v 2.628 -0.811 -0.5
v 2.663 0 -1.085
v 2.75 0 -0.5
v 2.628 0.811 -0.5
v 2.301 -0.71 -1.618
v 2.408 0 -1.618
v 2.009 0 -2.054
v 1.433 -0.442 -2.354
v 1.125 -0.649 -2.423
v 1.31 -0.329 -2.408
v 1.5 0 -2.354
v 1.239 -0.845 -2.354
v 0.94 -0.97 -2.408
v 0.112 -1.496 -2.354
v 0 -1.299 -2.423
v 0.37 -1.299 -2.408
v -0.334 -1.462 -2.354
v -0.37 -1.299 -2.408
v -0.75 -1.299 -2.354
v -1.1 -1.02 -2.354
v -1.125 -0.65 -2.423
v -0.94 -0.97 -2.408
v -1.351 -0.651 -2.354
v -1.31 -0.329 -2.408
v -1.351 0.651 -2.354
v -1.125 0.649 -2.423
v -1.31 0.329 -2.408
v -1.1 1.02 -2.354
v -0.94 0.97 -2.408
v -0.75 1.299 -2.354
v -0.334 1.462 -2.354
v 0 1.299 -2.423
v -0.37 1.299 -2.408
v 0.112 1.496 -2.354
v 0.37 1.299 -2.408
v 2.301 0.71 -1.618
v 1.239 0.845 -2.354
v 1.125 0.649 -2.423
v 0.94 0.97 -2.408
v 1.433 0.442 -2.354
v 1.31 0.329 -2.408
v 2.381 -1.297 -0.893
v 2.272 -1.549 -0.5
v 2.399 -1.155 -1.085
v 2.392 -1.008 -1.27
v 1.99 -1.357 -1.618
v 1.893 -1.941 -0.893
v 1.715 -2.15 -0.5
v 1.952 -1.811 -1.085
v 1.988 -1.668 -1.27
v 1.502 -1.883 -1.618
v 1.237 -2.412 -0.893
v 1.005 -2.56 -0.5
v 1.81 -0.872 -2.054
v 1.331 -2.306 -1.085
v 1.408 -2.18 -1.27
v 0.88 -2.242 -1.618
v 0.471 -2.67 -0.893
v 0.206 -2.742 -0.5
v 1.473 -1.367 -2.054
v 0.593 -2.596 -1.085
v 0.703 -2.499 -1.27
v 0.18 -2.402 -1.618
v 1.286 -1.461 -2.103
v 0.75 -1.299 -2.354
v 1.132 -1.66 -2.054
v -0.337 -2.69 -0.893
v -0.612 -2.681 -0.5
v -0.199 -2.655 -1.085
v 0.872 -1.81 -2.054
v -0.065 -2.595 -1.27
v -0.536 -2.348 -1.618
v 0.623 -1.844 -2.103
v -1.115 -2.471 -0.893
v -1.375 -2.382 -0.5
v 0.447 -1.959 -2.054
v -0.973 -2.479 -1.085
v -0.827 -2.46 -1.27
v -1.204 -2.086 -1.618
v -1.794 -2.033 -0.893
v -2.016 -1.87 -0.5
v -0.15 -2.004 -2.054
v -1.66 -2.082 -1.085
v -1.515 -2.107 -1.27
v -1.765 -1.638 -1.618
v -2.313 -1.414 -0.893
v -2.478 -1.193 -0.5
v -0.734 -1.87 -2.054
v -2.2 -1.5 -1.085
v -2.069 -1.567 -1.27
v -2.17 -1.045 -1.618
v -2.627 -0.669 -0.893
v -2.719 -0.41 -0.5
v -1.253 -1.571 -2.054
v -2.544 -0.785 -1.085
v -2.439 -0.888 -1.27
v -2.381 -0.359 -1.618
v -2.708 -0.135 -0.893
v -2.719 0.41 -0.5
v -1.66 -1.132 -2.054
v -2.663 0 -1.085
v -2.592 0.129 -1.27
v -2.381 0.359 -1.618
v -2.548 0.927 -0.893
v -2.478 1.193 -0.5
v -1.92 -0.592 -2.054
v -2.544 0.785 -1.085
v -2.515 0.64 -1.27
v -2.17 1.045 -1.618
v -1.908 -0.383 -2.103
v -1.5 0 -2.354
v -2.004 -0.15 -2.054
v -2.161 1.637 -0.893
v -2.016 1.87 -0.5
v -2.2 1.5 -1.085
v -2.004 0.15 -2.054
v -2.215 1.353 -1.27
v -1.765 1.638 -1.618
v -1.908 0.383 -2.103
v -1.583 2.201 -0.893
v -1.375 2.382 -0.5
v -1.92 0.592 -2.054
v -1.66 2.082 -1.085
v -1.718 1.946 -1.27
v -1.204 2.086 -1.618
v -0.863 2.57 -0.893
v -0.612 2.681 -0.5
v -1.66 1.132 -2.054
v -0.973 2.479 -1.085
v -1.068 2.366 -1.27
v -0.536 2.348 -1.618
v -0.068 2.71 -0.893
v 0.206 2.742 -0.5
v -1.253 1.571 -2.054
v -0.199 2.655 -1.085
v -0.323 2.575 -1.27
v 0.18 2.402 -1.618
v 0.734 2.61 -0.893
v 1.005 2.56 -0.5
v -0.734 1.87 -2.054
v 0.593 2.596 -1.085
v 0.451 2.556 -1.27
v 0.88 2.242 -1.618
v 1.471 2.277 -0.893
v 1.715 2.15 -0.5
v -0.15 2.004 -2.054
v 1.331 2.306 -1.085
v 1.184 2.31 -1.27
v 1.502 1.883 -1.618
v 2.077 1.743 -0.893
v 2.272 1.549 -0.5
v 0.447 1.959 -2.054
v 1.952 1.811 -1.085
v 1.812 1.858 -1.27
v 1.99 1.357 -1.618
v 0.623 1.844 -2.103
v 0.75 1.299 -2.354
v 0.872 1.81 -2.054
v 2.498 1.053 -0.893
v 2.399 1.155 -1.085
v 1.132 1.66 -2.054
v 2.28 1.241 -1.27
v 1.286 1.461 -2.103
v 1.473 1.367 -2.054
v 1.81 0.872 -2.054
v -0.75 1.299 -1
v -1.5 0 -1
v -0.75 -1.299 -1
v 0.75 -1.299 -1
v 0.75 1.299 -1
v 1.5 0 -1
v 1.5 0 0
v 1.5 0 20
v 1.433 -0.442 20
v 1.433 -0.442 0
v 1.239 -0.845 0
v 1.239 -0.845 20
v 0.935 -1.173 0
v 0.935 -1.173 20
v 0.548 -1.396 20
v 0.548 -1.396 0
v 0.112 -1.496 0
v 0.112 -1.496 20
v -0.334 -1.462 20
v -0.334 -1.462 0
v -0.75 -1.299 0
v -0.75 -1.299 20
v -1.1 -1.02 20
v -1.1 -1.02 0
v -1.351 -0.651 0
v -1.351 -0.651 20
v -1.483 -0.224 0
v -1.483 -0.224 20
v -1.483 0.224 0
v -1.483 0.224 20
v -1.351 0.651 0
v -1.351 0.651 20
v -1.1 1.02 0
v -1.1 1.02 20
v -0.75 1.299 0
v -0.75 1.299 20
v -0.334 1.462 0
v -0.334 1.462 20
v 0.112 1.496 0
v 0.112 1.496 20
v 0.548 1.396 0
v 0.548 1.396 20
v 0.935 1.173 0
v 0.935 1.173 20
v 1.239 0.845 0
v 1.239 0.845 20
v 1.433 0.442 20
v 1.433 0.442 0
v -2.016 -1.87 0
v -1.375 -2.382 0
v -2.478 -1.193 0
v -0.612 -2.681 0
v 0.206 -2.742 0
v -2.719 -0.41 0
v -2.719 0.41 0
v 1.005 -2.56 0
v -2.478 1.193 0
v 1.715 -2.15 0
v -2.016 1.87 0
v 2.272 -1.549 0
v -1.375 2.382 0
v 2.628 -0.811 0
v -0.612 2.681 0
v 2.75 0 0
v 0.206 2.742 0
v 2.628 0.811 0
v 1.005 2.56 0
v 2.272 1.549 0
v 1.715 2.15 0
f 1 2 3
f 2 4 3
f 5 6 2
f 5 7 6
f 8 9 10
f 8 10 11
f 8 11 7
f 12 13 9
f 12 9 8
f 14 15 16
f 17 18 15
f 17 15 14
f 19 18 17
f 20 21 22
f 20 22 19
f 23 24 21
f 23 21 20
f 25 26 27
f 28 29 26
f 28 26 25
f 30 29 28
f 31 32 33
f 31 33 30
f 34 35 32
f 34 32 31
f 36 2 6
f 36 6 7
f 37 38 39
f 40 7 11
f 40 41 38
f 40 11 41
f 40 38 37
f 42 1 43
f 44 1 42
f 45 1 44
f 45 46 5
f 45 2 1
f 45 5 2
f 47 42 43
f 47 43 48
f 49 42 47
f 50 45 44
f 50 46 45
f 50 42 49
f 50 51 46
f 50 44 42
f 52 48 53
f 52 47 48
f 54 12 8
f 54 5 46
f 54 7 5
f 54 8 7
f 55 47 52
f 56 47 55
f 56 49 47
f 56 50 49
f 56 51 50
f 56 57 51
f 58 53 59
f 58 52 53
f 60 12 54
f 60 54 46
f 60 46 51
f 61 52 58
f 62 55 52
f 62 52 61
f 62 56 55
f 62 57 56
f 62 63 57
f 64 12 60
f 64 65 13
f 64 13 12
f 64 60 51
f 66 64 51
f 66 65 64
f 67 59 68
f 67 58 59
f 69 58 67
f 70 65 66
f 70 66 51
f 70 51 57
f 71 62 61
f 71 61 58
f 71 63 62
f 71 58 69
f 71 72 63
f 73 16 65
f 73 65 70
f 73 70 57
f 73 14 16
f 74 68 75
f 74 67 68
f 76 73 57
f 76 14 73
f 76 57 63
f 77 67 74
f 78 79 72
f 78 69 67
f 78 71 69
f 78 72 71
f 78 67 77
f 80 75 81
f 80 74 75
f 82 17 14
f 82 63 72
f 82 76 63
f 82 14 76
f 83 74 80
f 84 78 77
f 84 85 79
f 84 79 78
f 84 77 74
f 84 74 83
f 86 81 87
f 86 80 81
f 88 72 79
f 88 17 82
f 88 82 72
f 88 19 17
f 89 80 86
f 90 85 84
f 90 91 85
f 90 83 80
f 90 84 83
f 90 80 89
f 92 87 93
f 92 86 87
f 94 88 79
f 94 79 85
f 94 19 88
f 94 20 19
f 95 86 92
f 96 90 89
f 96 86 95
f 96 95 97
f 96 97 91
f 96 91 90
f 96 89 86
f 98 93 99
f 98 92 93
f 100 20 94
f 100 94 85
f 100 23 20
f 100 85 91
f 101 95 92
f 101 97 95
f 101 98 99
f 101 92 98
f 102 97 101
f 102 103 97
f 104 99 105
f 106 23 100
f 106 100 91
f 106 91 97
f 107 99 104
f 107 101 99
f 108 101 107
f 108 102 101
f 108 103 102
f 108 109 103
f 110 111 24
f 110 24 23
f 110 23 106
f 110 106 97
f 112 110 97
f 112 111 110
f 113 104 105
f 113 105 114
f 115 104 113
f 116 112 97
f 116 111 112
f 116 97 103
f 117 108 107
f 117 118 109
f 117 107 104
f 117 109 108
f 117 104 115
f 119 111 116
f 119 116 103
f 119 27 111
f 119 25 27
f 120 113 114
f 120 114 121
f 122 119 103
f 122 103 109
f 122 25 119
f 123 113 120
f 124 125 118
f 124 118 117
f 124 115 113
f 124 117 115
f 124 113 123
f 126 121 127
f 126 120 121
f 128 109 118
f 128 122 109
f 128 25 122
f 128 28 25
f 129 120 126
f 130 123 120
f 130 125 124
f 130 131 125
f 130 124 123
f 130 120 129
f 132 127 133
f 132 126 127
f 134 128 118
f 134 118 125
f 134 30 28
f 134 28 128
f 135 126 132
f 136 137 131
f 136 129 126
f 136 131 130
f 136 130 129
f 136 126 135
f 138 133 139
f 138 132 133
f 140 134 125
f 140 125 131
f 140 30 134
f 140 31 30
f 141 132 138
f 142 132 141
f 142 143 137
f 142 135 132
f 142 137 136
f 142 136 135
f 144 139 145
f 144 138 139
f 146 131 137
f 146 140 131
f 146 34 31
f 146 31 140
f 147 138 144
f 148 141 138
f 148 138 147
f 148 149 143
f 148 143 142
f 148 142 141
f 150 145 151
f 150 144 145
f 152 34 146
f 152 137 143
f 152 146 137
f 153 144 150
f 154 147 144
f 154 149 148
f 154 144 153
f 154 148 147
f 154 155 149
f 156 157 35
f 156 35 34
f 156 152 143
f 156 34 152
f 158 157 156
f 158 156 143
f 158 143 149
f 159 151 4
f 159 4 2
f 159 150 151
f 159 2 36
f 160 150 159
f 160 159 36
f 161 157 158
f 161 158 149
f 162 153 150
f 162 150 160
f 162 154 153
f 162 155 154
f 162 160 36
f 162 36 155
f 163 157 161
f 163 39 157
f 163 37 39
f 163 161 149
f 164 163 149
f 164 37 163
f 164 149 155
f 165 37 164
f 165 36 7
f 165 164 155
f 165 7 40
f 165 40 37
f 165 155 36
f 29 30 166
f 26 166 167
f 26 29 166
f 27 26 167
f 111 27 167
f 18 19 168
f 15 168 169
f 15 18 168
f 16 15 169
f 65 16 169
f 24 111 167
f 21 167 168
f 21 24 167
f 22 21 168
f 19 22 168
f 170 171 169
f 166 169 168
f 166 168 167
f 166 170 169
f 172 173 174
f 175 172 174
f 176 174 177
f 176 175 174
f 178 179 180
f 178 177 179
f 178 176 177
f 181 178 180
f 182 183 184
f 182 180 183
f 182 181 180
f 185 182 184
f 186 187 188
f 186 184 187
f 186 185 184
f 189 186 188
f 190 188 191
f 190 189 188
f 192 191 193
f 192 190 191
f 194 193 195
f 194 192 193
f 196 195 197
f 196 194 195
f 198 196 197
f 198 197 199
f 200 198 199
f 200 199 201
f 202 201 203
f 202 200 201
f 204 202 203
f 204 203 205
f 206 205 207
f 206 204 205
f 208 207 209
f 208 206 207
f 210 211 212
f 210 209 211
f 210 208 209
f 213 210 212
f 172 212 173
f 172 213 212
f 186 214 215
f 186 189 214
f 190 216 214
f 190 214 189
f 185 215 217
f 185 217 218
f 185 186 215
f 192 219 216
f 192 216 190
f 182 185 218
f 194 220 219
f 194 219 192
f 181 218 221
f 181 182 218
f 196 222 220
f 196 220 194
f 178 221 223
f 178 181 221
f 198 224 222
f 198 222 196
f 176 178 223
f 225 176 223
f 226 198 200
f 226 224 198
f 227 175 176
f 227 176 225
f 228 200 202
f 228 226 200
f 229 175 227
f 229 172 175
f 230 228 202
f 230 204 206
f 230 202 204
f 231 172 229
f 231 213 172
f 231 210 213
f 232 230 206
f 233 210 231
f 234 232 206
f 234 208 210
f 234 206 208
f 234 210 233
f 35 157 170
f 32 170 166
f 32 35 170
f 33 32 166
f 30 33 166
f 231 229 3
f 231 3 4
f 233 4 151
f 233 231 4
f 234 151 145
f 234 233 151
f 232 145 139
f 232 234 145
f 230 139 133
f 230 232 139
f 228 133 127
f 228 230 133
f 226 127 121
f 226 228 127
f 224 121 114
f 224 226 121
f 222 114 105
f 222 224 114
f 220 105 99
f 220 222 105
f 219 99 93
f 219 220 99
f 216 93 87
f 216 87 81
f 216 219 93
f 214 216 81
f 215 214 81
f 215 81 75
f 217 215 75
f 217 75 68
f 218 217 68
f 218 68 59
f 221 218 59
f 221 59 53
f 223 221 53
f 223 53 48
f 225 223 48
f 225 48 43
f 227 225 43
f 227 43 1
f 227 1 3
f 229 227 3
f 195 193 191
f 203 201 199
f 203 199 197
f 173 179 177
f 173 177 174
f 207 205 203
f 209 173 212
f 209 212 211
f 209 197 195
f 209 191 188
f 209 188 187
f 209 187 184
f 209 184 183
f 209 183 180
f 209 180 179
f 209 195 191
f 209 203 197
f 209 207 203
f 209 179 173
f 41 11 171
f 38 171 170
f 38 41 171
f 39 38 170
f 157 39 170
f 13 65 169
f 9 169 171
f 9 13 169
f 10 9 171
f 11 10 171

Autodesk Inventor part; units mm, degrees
ref_plane "YZ Plane" through (0, 0, 0) normal (1, 0, 0) x (0, 1, 0)
ref_plane "XZ Plane" through (0, 0, 0) normal (0, 1, 0) x (-1, 0, 0)
ref_plane "XY Plane" through (0, 0, 0) normal (0, 0, 1) x (1, 0, 0)
sketch "Boceto1" plane through (0, 0, 0) normal (0, 0, 1) x (1, 0, 0)
  circle A0 centre (0, 0) radius 1.5
  circle A1 centre (0, 0) radius 2.75
  dimension "d0" = 3
  dimension "d1" = 5.5
extrude "Extrusión1" add sketch "Boceto1" along normal blind 20 contours A0
extrude "Extrusión2" add sketch "Boceto1" against normal blind 2.5 contours A0 | A1
sketch "Boceto2" plane through (0, 0, -2.5) normal (0, 0, -1) x (-1, 0, 0)
  line L0 (1.5, 0) -> (0.75, -1.299)
  line L1 (0.75, -1.299) -> (-0.75, -1.299)
  line L2 (-0.75, -1.299) -> (-1.5, 0)
  line L3 (-1.5, 0) -> (-0.75, 1.299)
  line L4 (-0.75, 1.299) -> (0.75, 1.299)
  line L5 (0.75, 1.299) -> (1.5, 0)
  point P0 (0, 0)
  point P1 (0, 0)
  dimension "d6" = 3
fillet "Empalme1" radius 2 1 edges at (-2.75, 0, -2.5)
extrude "Extrusión4" cut sketch "Boceto2" against normal blind 1.5
thread "Rosca1" size "M3x0.5" class "6g" standard "ANSI Metric M Profile" full length
properties part number "tonrilloM3x20mm" material "Acero inoxidable"
